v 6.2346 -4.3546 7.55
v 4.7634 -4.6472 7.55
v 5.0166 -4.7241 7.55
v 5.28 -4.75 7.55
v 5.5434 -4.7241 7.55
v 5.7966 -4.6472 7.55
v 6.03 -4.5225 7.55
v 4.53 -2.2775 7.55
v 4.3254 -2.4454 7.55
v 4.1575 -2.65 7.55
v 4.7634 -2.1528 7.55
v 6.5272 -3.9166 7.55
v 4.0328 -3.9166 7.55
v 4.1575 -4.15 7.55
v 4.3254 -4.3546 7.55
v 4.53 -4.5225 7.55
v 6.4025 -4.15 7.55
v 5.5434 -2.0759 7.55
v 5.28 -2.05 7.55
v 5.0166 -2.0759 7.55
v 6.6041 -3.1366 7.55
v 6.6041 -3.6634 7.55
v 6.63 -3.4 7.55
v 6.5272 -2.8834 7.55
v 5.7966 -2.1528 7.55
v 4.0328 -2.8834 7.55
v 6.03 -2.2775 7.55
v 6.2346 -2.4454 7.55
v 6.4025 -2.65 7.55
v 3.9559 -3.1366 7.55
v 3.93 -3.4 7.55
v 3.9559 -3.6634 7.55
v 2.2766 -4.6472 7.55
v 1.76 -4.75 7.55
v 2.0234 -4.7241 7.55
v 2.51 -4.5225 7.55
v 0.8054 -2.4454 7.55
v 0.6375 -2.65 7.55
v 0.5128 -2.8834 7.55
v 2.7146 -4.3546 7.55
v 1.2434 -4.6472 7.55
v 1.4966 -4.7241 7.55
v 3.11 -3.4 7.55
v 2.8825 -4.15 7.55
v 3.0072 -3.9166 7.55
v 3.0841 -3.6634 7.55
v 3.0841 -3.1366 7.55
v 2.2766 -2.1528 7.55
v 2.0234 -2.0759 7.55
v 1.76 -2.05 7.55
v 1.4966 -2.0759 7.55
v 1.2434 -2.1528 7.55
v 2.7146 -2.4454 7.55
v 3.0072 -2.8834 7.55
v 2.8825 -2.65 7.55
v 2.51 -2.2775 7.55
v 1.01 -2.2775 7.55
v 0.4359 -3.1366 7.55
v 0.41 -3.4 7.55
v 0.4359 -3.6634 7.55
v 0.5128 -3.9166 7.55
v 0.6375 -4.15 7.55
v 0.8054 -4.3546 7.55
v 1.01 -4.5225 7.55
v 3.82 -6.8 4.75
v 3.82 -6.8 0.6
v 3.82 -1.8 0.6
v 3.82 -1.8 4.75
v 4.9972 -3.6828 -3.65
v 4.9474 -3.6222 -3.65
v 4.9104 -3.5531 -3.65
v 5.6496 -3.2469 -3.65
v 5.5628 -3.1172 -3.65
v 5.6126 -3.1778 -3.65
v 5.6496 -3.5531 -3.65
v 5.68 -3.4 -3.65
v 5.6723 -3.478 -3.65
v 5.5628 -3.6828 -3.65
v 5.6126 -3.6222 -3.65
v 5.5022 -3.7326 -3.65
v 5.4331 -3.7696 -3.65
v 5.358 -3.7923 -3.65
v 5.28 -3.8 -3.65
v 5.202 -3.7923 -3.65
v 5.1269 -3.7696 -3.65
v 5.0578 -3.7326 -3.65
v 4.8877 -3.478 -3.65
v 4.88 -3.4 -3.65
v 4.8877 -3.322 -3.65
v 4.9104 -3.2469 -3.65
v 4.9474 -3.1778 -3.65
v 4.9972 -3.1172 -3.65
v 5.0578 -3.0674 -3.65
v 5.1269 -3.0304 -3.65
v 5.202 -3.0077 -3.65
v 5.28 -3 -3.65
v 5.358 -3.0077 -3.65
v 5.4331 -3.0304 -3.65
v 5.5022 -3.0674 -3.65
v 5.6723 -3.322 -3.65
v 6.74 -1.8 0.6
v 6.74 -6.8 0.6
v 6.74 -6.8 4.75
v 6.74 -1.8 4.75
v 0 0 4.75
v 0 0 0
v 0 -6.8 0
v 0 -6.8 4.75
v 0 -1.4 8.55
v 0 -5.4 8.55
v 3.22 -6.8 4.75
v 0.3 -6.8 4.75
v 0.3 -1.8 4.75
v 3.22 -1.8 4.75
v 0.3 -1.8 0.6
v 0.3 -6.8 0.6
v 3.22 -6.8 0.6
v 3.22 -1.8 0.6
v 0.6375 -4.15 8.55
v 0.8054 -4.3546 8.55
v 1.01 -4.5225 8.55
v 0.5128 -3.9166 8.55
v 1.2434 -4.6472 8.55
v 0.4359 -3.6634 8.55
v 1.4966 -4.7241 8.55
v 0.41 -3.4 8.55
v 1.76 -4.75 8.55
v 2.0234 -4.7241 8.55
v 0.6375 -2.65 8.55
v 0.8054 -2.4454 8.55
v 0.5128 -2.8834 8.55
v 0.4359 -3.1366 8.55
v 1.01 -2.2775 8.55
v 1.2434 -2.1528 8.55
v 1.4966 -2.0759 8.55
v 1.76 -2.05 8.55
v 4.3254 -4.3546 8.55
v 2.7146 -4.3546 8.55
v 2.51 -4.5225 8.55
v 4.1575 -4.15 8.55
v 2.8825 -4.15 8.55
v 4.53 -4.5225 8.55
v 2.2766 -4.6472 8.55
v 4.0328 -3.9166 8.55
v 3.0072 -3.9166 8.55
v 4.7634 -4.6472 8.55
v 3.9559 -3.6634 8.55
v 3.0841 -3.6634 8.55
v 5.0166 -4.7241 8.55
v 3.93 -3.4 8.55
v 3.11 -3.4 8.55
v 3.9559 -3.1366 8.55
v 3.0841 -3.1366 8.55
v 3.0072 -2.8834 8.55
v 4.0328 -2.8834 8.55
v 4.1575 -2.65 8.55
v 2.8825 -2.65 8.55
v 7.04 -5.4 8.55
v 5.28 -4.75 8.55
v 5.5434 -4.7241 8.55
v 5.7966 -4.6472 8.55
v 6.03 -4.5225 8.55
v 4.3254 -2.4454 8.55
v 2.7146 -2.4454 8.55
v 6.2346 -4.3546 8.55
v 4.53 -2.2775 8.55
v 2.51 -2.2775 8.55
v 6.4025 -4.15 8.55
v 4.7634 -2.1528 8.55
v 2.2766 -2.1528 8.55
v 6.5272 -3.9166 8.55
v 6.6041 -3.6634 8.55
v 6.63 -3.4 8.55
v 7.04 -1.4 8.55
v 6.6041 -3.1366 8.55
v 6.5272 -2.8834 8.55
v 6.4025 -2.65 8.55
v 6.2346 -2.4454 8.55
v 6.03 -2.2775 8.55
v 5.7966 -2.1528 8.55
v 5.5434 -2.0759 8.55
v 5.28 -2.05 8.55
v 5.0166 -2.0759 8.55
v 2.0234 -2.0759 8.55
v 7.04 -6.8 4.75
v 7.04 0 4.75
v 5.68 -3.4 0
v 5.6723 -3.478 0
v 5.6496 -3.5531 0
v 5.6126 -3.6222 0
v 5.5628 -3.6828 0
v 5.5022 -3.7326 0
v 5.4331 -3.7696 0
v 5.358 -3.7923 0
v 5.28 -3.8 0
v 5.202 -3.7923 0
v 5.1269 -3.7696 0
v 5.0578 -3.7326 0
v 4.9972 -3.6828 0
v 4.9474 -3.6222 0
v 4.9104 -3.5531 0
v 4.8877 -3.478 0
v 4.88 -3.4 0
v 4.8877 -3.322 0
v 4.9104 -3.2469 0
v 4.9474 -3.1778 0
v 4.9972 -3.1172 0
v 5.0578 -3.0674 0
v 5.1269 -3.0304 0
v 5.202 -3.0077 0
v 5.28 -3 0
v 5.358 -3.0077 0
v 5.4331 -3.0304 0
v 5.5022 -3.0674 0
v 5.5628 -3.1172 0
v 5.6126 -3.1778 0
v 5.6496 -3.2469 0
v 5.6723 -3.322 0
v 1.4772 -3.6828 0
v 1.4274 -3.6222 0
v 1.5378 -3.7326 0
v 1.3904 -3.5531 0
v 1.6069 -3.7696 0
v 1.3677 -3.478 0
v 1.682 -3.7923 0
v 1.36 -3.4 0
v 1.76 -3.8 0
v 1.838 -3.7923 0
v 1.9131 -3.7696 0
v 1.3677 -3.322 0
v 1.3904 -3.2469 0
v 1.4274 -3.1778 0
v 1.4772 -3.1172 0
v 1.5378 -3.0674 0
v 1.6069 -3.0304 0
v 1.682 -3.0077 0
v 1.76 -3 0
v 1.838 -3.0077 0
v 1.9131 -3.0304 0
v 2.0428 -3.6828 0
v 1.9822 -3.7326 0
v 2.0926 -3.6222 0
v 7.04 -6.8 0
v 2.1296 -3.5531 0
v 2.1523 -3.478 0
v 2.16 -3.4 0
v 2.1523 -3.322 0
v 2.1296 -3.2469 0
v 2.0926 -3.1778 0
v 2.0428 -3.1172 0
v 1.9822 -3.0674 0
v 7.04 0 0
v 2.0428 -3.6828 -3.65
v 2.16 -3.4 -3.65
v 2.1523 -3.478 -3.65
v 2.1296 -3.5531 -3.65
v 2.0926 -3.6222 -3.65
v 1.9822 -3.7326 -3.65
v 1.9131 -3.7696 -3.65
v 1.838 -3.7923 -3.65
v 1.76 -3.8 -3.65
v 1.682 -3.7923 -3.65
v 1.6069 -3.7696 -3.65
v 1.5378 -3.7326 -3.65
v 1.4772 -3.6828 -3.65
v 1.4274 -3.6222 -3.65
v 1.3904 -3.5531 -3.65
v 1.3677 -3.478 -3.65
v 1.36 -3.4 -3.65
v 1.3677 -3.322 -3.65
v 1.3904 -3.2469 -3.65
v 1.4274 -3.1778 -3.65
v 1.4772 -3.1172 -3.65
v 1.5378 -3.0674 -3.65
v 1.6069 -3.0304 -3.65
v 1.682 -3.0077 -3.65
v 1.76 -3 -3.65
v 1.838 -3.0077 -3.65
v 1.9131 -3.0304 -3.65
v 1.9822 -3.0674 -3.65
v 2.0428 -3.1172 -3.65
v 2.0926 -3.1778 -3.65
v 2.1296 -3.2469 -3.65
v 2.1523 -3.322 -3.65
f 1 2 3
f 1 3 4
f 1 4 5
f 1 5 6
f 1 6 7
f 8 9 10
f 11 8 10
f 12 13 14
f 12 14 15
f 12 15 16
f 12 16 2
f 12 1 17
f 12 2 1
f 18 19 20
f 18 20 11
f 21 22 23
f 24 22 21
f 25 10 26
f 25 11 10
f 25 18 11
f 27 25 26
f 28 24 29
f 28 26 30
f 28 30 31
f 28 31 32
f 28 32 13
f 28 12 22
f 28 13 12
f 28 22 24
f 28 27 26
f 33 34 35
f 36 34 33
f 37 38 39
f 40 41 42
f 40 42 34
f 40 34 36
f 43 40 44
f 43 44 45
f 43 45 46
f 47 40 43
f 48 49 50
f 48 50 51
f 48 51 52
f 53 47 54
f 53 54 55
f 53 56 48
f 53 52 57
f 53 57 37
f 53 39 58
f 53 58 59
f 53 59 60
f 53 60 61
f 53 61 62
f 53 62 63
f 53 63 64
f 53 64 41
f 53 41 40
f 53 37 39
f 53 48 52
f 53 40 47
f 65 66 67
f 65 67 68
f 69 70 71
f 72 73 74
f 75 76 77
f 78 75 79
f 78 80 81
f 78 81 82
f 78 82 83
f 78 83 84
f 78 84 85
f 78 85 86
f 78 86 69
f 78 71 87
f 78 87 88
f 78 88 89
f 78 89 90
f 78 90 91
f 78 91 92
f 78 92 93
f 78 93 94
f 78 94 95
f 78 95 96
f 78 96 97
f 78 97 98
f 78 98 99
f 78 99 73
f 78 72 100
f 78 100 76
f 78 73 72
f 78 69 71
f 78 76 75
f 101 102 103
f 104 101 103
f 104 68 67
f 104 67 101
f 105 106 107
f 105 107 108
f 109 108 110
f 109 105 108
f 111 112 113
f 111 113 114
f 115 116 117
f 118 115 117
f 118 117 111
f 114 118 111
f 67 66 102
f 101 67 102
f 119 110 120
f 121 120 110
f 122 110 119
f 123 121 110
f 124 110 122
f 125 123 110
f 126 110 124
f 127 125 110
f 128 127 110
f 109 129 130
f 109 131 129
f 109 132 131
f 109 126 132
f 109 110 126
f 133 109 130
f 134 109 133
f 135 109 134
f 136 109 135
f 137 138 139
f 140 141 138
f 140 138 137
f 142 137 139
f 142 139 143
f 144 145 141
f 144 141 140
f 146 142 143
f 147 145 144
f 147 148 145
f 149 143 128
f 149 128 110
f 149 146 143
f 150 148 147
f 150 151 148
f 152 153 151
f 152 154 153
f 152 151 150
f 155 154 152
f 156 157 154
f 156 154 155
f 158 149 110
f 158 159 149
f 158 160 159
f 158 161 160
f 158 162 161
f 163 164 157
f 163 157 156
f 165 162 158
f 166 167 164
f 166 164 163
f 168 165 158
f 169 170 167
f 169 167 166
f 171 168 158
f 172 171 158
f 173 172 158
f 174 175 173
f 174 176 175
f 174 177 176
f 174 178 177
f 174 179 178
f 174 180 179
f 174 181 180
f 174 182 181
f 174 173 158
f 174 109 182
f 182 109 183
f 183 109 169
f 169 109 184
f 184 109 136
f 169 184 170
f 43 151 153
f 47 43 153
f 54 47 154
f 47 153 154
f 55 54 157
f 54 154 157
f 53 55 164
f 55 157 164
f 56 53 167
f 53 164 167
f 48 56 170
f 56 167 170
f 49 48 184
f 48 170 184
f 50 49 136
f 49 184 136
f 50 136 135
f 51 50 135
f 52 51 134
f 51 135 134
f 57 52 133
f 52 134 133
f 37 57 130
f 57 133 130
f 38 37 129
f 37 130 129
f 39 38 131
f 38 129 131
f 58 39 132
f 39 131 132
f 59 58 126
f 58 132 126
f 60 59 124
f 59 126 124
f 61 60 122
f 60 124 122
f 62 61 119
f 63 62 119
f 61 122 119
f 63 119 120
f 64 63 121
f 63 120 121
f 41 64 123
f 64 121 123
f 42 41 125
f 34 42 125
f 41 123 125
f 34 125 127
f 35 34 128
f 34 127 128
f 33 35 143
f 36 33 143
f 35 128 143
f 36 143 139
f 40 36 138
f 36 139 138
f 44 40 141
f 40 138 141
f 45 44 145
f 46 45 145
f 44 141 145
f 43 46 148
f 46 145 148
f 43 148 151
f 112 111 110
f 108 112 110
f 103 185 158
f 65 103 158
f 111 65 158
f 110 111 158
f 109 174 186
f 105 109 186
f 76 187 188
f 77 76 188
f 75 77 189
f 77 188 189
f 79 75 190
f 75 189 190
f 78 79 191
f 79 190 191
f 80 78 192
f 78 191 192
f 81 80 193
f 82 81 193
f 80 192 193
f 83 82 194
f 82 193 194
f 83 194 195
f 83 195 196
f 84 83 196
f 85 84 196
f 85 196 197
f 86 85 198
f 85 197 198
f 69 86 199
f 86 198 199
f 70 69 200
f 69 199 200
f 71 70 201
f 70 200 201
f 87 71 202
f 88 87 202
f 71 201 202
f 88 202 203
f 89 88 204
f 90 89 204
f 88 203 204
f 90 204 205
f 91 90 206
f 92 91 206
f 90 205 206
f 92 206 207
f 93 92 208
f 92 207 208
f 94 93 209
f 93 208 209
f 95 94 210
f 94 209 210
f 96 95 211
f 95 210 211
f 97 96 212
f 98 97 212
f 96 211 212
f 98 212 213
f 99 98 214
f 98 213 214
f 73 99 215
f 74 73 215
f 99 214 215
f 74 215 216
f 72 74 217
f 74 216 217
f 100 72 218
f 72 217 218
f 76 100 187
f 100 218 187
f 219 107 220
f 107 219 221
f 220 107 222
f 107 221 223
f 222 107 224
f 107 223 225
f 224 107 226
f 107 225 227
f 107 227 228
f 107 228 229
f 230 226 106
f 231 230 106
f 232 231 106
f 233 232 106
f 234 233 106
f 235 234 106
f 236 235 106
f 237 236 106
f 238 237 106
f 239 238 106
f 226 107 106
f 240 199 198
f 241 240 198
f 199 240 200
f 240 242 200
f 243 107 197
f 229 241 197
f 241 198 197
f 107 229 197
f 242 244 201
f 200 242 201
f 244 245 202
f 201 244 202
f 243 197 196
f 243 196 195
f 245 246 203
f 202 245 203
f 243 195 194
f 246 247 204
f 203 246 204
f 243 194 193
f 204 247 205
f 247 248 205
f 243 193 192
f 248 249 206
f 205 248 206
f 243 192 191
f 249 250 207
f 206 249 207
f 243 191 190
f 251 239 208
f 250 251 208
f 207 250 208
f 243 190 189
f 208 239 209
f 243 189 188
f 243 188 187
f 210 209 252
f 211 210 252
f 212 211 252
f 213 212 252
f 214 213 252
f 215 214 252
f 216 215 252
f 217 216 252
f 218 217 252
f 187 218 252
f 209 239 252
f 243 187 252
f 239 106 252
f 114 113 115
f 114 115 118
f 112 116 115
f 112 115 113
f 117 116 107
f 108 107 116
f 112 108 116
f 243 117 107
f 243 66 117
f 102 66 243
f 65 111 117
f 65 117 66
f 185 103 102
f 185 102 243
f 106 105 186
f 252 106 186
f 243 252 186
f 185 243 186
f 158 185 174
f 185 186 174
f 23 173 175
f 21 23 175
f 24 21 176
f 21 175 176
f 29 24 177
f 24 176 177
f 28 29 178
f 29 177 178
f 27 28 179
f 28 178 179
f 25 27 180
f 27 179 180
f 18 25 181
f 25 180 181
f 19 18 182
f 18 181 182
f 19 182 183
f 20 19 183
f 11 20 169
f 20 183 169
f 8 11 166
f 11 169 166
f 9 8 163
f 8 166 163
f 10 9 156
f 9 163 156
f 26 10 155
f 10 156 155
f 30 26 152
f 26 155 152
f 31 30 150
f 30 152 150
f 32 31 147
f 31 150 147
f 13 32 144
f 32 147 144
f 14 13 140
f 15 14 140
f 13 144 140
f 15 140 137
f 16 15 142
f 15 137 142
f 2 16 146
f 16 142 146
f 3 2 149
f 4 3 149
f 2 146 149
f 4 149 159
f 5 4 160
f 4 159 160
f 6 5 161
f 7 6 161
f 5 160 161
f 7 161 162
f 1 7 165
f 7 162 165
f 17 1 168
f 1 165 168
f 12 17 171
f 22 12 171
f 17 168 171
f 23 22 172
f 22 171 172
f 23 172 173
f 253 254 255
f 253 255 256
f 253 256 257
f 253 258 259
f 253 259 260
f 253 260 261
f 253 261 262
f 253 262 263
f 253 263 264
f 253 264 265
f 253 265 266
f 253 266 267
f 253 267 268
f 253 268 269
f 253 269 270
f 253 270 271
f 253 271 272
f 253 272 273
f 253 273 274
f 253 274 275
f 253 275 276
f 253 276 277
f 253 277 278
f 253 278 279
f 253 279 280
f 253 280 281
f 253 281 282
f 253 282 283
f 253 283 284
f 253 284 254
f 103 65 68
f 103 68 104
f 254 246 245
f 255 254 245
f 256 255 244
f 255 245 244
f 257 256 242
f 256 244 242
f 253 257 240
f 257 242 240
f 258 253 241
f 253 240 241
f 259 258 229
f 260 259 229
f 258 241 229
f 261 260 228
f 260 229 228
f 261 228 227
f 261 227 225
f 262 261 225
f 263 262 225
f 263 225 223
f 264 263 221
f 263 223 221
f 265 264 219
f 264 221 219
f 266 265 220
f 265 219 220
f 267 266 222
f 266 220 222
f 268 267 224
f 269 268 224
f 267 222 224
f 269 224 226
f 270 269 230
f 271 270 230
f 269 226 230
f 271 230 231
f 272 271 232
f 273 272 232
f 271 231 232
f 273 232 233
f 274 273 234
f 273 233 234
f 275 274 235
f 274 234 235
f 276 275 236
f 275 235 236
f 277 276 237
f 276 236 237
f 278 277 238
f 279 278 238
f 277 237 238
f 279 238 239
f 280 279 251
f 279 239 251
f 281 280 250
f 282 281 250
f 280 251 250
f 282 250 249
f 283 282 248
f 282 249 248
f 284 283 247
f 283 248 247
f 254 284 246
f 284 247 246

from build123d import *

# Parameters (mm, degrees)
F0_W     = 7.04
F0_H     = 8.55
F1_DEPTH = 6.8
F3_DEPTH = 7.04
F4_W     = 2.92
F4_H     = 4.15
F5_DEPTH = 5
F6_R     = 1.35
F7_DEPTH = 1
F8_R     = 0.4
F9_DEPTH = 3.65


with BuildPart() as f1:
    # F0 (on Front) → F1 (new body)
    with BuildSketch(Plane.XZ):
        with Locations((3.52, 4.275)):
            Rectangle(F0_W, F0_H)
    extrude(amount=F1_DEPTH)

    # F2 (on face) → F3 (cut, through all)
    with BuildSketch(Plane.YZ.offset(7.04)):
        Polygon((-6.8, 8.55), (-6.8, 4.75), (-5.4, 8.55), align=None)
        Polygon((0, 4.75), (0, 8.55), (-1.4, 8.55), align=None)
    extrude(amount=-F3_DEPTH, mode=Mode.SUBTRACT)

    # F4 (on face) → F5 (cut)
    with BuildSketch(Plane.XZ.offset(6.8)):
        with Locations((1.76, 2.675)):
            Rectangle(F4_W, F4_H)
        with Locations((5.28, 2.675)):
            Rectangle(F4_W, F4_H)
    extrude(amount=-F5_DEPTH, mode=Mode.SUBTRACT)

    # F6 (on face) → F7 (cut)
    with BuildSketch(Plane.XY.offset(8.55)):
        with Locations((1.76, -3.4)):
            Circle(F6_R)
        with Locations((5.28, -3.4)):
            Circle(F6_R)
    extrude(amount=-F7_DEPTH, mode=Mode.SUBTRACT)

    # F8 (on face) → F9 (join)
    with BuildSketch(Plane(origin=(0, 0, 0), x_dir=(1, 0, 0), z_dir=(0, 0, -1))):
        with Locations((1.76, 3.4)):
            Circle(F8_R)
        with Locations((5.28, 3.4)):
            Circle(F8_R)
    extrude(amount=F9_DEPTH)


solid = f1.part
